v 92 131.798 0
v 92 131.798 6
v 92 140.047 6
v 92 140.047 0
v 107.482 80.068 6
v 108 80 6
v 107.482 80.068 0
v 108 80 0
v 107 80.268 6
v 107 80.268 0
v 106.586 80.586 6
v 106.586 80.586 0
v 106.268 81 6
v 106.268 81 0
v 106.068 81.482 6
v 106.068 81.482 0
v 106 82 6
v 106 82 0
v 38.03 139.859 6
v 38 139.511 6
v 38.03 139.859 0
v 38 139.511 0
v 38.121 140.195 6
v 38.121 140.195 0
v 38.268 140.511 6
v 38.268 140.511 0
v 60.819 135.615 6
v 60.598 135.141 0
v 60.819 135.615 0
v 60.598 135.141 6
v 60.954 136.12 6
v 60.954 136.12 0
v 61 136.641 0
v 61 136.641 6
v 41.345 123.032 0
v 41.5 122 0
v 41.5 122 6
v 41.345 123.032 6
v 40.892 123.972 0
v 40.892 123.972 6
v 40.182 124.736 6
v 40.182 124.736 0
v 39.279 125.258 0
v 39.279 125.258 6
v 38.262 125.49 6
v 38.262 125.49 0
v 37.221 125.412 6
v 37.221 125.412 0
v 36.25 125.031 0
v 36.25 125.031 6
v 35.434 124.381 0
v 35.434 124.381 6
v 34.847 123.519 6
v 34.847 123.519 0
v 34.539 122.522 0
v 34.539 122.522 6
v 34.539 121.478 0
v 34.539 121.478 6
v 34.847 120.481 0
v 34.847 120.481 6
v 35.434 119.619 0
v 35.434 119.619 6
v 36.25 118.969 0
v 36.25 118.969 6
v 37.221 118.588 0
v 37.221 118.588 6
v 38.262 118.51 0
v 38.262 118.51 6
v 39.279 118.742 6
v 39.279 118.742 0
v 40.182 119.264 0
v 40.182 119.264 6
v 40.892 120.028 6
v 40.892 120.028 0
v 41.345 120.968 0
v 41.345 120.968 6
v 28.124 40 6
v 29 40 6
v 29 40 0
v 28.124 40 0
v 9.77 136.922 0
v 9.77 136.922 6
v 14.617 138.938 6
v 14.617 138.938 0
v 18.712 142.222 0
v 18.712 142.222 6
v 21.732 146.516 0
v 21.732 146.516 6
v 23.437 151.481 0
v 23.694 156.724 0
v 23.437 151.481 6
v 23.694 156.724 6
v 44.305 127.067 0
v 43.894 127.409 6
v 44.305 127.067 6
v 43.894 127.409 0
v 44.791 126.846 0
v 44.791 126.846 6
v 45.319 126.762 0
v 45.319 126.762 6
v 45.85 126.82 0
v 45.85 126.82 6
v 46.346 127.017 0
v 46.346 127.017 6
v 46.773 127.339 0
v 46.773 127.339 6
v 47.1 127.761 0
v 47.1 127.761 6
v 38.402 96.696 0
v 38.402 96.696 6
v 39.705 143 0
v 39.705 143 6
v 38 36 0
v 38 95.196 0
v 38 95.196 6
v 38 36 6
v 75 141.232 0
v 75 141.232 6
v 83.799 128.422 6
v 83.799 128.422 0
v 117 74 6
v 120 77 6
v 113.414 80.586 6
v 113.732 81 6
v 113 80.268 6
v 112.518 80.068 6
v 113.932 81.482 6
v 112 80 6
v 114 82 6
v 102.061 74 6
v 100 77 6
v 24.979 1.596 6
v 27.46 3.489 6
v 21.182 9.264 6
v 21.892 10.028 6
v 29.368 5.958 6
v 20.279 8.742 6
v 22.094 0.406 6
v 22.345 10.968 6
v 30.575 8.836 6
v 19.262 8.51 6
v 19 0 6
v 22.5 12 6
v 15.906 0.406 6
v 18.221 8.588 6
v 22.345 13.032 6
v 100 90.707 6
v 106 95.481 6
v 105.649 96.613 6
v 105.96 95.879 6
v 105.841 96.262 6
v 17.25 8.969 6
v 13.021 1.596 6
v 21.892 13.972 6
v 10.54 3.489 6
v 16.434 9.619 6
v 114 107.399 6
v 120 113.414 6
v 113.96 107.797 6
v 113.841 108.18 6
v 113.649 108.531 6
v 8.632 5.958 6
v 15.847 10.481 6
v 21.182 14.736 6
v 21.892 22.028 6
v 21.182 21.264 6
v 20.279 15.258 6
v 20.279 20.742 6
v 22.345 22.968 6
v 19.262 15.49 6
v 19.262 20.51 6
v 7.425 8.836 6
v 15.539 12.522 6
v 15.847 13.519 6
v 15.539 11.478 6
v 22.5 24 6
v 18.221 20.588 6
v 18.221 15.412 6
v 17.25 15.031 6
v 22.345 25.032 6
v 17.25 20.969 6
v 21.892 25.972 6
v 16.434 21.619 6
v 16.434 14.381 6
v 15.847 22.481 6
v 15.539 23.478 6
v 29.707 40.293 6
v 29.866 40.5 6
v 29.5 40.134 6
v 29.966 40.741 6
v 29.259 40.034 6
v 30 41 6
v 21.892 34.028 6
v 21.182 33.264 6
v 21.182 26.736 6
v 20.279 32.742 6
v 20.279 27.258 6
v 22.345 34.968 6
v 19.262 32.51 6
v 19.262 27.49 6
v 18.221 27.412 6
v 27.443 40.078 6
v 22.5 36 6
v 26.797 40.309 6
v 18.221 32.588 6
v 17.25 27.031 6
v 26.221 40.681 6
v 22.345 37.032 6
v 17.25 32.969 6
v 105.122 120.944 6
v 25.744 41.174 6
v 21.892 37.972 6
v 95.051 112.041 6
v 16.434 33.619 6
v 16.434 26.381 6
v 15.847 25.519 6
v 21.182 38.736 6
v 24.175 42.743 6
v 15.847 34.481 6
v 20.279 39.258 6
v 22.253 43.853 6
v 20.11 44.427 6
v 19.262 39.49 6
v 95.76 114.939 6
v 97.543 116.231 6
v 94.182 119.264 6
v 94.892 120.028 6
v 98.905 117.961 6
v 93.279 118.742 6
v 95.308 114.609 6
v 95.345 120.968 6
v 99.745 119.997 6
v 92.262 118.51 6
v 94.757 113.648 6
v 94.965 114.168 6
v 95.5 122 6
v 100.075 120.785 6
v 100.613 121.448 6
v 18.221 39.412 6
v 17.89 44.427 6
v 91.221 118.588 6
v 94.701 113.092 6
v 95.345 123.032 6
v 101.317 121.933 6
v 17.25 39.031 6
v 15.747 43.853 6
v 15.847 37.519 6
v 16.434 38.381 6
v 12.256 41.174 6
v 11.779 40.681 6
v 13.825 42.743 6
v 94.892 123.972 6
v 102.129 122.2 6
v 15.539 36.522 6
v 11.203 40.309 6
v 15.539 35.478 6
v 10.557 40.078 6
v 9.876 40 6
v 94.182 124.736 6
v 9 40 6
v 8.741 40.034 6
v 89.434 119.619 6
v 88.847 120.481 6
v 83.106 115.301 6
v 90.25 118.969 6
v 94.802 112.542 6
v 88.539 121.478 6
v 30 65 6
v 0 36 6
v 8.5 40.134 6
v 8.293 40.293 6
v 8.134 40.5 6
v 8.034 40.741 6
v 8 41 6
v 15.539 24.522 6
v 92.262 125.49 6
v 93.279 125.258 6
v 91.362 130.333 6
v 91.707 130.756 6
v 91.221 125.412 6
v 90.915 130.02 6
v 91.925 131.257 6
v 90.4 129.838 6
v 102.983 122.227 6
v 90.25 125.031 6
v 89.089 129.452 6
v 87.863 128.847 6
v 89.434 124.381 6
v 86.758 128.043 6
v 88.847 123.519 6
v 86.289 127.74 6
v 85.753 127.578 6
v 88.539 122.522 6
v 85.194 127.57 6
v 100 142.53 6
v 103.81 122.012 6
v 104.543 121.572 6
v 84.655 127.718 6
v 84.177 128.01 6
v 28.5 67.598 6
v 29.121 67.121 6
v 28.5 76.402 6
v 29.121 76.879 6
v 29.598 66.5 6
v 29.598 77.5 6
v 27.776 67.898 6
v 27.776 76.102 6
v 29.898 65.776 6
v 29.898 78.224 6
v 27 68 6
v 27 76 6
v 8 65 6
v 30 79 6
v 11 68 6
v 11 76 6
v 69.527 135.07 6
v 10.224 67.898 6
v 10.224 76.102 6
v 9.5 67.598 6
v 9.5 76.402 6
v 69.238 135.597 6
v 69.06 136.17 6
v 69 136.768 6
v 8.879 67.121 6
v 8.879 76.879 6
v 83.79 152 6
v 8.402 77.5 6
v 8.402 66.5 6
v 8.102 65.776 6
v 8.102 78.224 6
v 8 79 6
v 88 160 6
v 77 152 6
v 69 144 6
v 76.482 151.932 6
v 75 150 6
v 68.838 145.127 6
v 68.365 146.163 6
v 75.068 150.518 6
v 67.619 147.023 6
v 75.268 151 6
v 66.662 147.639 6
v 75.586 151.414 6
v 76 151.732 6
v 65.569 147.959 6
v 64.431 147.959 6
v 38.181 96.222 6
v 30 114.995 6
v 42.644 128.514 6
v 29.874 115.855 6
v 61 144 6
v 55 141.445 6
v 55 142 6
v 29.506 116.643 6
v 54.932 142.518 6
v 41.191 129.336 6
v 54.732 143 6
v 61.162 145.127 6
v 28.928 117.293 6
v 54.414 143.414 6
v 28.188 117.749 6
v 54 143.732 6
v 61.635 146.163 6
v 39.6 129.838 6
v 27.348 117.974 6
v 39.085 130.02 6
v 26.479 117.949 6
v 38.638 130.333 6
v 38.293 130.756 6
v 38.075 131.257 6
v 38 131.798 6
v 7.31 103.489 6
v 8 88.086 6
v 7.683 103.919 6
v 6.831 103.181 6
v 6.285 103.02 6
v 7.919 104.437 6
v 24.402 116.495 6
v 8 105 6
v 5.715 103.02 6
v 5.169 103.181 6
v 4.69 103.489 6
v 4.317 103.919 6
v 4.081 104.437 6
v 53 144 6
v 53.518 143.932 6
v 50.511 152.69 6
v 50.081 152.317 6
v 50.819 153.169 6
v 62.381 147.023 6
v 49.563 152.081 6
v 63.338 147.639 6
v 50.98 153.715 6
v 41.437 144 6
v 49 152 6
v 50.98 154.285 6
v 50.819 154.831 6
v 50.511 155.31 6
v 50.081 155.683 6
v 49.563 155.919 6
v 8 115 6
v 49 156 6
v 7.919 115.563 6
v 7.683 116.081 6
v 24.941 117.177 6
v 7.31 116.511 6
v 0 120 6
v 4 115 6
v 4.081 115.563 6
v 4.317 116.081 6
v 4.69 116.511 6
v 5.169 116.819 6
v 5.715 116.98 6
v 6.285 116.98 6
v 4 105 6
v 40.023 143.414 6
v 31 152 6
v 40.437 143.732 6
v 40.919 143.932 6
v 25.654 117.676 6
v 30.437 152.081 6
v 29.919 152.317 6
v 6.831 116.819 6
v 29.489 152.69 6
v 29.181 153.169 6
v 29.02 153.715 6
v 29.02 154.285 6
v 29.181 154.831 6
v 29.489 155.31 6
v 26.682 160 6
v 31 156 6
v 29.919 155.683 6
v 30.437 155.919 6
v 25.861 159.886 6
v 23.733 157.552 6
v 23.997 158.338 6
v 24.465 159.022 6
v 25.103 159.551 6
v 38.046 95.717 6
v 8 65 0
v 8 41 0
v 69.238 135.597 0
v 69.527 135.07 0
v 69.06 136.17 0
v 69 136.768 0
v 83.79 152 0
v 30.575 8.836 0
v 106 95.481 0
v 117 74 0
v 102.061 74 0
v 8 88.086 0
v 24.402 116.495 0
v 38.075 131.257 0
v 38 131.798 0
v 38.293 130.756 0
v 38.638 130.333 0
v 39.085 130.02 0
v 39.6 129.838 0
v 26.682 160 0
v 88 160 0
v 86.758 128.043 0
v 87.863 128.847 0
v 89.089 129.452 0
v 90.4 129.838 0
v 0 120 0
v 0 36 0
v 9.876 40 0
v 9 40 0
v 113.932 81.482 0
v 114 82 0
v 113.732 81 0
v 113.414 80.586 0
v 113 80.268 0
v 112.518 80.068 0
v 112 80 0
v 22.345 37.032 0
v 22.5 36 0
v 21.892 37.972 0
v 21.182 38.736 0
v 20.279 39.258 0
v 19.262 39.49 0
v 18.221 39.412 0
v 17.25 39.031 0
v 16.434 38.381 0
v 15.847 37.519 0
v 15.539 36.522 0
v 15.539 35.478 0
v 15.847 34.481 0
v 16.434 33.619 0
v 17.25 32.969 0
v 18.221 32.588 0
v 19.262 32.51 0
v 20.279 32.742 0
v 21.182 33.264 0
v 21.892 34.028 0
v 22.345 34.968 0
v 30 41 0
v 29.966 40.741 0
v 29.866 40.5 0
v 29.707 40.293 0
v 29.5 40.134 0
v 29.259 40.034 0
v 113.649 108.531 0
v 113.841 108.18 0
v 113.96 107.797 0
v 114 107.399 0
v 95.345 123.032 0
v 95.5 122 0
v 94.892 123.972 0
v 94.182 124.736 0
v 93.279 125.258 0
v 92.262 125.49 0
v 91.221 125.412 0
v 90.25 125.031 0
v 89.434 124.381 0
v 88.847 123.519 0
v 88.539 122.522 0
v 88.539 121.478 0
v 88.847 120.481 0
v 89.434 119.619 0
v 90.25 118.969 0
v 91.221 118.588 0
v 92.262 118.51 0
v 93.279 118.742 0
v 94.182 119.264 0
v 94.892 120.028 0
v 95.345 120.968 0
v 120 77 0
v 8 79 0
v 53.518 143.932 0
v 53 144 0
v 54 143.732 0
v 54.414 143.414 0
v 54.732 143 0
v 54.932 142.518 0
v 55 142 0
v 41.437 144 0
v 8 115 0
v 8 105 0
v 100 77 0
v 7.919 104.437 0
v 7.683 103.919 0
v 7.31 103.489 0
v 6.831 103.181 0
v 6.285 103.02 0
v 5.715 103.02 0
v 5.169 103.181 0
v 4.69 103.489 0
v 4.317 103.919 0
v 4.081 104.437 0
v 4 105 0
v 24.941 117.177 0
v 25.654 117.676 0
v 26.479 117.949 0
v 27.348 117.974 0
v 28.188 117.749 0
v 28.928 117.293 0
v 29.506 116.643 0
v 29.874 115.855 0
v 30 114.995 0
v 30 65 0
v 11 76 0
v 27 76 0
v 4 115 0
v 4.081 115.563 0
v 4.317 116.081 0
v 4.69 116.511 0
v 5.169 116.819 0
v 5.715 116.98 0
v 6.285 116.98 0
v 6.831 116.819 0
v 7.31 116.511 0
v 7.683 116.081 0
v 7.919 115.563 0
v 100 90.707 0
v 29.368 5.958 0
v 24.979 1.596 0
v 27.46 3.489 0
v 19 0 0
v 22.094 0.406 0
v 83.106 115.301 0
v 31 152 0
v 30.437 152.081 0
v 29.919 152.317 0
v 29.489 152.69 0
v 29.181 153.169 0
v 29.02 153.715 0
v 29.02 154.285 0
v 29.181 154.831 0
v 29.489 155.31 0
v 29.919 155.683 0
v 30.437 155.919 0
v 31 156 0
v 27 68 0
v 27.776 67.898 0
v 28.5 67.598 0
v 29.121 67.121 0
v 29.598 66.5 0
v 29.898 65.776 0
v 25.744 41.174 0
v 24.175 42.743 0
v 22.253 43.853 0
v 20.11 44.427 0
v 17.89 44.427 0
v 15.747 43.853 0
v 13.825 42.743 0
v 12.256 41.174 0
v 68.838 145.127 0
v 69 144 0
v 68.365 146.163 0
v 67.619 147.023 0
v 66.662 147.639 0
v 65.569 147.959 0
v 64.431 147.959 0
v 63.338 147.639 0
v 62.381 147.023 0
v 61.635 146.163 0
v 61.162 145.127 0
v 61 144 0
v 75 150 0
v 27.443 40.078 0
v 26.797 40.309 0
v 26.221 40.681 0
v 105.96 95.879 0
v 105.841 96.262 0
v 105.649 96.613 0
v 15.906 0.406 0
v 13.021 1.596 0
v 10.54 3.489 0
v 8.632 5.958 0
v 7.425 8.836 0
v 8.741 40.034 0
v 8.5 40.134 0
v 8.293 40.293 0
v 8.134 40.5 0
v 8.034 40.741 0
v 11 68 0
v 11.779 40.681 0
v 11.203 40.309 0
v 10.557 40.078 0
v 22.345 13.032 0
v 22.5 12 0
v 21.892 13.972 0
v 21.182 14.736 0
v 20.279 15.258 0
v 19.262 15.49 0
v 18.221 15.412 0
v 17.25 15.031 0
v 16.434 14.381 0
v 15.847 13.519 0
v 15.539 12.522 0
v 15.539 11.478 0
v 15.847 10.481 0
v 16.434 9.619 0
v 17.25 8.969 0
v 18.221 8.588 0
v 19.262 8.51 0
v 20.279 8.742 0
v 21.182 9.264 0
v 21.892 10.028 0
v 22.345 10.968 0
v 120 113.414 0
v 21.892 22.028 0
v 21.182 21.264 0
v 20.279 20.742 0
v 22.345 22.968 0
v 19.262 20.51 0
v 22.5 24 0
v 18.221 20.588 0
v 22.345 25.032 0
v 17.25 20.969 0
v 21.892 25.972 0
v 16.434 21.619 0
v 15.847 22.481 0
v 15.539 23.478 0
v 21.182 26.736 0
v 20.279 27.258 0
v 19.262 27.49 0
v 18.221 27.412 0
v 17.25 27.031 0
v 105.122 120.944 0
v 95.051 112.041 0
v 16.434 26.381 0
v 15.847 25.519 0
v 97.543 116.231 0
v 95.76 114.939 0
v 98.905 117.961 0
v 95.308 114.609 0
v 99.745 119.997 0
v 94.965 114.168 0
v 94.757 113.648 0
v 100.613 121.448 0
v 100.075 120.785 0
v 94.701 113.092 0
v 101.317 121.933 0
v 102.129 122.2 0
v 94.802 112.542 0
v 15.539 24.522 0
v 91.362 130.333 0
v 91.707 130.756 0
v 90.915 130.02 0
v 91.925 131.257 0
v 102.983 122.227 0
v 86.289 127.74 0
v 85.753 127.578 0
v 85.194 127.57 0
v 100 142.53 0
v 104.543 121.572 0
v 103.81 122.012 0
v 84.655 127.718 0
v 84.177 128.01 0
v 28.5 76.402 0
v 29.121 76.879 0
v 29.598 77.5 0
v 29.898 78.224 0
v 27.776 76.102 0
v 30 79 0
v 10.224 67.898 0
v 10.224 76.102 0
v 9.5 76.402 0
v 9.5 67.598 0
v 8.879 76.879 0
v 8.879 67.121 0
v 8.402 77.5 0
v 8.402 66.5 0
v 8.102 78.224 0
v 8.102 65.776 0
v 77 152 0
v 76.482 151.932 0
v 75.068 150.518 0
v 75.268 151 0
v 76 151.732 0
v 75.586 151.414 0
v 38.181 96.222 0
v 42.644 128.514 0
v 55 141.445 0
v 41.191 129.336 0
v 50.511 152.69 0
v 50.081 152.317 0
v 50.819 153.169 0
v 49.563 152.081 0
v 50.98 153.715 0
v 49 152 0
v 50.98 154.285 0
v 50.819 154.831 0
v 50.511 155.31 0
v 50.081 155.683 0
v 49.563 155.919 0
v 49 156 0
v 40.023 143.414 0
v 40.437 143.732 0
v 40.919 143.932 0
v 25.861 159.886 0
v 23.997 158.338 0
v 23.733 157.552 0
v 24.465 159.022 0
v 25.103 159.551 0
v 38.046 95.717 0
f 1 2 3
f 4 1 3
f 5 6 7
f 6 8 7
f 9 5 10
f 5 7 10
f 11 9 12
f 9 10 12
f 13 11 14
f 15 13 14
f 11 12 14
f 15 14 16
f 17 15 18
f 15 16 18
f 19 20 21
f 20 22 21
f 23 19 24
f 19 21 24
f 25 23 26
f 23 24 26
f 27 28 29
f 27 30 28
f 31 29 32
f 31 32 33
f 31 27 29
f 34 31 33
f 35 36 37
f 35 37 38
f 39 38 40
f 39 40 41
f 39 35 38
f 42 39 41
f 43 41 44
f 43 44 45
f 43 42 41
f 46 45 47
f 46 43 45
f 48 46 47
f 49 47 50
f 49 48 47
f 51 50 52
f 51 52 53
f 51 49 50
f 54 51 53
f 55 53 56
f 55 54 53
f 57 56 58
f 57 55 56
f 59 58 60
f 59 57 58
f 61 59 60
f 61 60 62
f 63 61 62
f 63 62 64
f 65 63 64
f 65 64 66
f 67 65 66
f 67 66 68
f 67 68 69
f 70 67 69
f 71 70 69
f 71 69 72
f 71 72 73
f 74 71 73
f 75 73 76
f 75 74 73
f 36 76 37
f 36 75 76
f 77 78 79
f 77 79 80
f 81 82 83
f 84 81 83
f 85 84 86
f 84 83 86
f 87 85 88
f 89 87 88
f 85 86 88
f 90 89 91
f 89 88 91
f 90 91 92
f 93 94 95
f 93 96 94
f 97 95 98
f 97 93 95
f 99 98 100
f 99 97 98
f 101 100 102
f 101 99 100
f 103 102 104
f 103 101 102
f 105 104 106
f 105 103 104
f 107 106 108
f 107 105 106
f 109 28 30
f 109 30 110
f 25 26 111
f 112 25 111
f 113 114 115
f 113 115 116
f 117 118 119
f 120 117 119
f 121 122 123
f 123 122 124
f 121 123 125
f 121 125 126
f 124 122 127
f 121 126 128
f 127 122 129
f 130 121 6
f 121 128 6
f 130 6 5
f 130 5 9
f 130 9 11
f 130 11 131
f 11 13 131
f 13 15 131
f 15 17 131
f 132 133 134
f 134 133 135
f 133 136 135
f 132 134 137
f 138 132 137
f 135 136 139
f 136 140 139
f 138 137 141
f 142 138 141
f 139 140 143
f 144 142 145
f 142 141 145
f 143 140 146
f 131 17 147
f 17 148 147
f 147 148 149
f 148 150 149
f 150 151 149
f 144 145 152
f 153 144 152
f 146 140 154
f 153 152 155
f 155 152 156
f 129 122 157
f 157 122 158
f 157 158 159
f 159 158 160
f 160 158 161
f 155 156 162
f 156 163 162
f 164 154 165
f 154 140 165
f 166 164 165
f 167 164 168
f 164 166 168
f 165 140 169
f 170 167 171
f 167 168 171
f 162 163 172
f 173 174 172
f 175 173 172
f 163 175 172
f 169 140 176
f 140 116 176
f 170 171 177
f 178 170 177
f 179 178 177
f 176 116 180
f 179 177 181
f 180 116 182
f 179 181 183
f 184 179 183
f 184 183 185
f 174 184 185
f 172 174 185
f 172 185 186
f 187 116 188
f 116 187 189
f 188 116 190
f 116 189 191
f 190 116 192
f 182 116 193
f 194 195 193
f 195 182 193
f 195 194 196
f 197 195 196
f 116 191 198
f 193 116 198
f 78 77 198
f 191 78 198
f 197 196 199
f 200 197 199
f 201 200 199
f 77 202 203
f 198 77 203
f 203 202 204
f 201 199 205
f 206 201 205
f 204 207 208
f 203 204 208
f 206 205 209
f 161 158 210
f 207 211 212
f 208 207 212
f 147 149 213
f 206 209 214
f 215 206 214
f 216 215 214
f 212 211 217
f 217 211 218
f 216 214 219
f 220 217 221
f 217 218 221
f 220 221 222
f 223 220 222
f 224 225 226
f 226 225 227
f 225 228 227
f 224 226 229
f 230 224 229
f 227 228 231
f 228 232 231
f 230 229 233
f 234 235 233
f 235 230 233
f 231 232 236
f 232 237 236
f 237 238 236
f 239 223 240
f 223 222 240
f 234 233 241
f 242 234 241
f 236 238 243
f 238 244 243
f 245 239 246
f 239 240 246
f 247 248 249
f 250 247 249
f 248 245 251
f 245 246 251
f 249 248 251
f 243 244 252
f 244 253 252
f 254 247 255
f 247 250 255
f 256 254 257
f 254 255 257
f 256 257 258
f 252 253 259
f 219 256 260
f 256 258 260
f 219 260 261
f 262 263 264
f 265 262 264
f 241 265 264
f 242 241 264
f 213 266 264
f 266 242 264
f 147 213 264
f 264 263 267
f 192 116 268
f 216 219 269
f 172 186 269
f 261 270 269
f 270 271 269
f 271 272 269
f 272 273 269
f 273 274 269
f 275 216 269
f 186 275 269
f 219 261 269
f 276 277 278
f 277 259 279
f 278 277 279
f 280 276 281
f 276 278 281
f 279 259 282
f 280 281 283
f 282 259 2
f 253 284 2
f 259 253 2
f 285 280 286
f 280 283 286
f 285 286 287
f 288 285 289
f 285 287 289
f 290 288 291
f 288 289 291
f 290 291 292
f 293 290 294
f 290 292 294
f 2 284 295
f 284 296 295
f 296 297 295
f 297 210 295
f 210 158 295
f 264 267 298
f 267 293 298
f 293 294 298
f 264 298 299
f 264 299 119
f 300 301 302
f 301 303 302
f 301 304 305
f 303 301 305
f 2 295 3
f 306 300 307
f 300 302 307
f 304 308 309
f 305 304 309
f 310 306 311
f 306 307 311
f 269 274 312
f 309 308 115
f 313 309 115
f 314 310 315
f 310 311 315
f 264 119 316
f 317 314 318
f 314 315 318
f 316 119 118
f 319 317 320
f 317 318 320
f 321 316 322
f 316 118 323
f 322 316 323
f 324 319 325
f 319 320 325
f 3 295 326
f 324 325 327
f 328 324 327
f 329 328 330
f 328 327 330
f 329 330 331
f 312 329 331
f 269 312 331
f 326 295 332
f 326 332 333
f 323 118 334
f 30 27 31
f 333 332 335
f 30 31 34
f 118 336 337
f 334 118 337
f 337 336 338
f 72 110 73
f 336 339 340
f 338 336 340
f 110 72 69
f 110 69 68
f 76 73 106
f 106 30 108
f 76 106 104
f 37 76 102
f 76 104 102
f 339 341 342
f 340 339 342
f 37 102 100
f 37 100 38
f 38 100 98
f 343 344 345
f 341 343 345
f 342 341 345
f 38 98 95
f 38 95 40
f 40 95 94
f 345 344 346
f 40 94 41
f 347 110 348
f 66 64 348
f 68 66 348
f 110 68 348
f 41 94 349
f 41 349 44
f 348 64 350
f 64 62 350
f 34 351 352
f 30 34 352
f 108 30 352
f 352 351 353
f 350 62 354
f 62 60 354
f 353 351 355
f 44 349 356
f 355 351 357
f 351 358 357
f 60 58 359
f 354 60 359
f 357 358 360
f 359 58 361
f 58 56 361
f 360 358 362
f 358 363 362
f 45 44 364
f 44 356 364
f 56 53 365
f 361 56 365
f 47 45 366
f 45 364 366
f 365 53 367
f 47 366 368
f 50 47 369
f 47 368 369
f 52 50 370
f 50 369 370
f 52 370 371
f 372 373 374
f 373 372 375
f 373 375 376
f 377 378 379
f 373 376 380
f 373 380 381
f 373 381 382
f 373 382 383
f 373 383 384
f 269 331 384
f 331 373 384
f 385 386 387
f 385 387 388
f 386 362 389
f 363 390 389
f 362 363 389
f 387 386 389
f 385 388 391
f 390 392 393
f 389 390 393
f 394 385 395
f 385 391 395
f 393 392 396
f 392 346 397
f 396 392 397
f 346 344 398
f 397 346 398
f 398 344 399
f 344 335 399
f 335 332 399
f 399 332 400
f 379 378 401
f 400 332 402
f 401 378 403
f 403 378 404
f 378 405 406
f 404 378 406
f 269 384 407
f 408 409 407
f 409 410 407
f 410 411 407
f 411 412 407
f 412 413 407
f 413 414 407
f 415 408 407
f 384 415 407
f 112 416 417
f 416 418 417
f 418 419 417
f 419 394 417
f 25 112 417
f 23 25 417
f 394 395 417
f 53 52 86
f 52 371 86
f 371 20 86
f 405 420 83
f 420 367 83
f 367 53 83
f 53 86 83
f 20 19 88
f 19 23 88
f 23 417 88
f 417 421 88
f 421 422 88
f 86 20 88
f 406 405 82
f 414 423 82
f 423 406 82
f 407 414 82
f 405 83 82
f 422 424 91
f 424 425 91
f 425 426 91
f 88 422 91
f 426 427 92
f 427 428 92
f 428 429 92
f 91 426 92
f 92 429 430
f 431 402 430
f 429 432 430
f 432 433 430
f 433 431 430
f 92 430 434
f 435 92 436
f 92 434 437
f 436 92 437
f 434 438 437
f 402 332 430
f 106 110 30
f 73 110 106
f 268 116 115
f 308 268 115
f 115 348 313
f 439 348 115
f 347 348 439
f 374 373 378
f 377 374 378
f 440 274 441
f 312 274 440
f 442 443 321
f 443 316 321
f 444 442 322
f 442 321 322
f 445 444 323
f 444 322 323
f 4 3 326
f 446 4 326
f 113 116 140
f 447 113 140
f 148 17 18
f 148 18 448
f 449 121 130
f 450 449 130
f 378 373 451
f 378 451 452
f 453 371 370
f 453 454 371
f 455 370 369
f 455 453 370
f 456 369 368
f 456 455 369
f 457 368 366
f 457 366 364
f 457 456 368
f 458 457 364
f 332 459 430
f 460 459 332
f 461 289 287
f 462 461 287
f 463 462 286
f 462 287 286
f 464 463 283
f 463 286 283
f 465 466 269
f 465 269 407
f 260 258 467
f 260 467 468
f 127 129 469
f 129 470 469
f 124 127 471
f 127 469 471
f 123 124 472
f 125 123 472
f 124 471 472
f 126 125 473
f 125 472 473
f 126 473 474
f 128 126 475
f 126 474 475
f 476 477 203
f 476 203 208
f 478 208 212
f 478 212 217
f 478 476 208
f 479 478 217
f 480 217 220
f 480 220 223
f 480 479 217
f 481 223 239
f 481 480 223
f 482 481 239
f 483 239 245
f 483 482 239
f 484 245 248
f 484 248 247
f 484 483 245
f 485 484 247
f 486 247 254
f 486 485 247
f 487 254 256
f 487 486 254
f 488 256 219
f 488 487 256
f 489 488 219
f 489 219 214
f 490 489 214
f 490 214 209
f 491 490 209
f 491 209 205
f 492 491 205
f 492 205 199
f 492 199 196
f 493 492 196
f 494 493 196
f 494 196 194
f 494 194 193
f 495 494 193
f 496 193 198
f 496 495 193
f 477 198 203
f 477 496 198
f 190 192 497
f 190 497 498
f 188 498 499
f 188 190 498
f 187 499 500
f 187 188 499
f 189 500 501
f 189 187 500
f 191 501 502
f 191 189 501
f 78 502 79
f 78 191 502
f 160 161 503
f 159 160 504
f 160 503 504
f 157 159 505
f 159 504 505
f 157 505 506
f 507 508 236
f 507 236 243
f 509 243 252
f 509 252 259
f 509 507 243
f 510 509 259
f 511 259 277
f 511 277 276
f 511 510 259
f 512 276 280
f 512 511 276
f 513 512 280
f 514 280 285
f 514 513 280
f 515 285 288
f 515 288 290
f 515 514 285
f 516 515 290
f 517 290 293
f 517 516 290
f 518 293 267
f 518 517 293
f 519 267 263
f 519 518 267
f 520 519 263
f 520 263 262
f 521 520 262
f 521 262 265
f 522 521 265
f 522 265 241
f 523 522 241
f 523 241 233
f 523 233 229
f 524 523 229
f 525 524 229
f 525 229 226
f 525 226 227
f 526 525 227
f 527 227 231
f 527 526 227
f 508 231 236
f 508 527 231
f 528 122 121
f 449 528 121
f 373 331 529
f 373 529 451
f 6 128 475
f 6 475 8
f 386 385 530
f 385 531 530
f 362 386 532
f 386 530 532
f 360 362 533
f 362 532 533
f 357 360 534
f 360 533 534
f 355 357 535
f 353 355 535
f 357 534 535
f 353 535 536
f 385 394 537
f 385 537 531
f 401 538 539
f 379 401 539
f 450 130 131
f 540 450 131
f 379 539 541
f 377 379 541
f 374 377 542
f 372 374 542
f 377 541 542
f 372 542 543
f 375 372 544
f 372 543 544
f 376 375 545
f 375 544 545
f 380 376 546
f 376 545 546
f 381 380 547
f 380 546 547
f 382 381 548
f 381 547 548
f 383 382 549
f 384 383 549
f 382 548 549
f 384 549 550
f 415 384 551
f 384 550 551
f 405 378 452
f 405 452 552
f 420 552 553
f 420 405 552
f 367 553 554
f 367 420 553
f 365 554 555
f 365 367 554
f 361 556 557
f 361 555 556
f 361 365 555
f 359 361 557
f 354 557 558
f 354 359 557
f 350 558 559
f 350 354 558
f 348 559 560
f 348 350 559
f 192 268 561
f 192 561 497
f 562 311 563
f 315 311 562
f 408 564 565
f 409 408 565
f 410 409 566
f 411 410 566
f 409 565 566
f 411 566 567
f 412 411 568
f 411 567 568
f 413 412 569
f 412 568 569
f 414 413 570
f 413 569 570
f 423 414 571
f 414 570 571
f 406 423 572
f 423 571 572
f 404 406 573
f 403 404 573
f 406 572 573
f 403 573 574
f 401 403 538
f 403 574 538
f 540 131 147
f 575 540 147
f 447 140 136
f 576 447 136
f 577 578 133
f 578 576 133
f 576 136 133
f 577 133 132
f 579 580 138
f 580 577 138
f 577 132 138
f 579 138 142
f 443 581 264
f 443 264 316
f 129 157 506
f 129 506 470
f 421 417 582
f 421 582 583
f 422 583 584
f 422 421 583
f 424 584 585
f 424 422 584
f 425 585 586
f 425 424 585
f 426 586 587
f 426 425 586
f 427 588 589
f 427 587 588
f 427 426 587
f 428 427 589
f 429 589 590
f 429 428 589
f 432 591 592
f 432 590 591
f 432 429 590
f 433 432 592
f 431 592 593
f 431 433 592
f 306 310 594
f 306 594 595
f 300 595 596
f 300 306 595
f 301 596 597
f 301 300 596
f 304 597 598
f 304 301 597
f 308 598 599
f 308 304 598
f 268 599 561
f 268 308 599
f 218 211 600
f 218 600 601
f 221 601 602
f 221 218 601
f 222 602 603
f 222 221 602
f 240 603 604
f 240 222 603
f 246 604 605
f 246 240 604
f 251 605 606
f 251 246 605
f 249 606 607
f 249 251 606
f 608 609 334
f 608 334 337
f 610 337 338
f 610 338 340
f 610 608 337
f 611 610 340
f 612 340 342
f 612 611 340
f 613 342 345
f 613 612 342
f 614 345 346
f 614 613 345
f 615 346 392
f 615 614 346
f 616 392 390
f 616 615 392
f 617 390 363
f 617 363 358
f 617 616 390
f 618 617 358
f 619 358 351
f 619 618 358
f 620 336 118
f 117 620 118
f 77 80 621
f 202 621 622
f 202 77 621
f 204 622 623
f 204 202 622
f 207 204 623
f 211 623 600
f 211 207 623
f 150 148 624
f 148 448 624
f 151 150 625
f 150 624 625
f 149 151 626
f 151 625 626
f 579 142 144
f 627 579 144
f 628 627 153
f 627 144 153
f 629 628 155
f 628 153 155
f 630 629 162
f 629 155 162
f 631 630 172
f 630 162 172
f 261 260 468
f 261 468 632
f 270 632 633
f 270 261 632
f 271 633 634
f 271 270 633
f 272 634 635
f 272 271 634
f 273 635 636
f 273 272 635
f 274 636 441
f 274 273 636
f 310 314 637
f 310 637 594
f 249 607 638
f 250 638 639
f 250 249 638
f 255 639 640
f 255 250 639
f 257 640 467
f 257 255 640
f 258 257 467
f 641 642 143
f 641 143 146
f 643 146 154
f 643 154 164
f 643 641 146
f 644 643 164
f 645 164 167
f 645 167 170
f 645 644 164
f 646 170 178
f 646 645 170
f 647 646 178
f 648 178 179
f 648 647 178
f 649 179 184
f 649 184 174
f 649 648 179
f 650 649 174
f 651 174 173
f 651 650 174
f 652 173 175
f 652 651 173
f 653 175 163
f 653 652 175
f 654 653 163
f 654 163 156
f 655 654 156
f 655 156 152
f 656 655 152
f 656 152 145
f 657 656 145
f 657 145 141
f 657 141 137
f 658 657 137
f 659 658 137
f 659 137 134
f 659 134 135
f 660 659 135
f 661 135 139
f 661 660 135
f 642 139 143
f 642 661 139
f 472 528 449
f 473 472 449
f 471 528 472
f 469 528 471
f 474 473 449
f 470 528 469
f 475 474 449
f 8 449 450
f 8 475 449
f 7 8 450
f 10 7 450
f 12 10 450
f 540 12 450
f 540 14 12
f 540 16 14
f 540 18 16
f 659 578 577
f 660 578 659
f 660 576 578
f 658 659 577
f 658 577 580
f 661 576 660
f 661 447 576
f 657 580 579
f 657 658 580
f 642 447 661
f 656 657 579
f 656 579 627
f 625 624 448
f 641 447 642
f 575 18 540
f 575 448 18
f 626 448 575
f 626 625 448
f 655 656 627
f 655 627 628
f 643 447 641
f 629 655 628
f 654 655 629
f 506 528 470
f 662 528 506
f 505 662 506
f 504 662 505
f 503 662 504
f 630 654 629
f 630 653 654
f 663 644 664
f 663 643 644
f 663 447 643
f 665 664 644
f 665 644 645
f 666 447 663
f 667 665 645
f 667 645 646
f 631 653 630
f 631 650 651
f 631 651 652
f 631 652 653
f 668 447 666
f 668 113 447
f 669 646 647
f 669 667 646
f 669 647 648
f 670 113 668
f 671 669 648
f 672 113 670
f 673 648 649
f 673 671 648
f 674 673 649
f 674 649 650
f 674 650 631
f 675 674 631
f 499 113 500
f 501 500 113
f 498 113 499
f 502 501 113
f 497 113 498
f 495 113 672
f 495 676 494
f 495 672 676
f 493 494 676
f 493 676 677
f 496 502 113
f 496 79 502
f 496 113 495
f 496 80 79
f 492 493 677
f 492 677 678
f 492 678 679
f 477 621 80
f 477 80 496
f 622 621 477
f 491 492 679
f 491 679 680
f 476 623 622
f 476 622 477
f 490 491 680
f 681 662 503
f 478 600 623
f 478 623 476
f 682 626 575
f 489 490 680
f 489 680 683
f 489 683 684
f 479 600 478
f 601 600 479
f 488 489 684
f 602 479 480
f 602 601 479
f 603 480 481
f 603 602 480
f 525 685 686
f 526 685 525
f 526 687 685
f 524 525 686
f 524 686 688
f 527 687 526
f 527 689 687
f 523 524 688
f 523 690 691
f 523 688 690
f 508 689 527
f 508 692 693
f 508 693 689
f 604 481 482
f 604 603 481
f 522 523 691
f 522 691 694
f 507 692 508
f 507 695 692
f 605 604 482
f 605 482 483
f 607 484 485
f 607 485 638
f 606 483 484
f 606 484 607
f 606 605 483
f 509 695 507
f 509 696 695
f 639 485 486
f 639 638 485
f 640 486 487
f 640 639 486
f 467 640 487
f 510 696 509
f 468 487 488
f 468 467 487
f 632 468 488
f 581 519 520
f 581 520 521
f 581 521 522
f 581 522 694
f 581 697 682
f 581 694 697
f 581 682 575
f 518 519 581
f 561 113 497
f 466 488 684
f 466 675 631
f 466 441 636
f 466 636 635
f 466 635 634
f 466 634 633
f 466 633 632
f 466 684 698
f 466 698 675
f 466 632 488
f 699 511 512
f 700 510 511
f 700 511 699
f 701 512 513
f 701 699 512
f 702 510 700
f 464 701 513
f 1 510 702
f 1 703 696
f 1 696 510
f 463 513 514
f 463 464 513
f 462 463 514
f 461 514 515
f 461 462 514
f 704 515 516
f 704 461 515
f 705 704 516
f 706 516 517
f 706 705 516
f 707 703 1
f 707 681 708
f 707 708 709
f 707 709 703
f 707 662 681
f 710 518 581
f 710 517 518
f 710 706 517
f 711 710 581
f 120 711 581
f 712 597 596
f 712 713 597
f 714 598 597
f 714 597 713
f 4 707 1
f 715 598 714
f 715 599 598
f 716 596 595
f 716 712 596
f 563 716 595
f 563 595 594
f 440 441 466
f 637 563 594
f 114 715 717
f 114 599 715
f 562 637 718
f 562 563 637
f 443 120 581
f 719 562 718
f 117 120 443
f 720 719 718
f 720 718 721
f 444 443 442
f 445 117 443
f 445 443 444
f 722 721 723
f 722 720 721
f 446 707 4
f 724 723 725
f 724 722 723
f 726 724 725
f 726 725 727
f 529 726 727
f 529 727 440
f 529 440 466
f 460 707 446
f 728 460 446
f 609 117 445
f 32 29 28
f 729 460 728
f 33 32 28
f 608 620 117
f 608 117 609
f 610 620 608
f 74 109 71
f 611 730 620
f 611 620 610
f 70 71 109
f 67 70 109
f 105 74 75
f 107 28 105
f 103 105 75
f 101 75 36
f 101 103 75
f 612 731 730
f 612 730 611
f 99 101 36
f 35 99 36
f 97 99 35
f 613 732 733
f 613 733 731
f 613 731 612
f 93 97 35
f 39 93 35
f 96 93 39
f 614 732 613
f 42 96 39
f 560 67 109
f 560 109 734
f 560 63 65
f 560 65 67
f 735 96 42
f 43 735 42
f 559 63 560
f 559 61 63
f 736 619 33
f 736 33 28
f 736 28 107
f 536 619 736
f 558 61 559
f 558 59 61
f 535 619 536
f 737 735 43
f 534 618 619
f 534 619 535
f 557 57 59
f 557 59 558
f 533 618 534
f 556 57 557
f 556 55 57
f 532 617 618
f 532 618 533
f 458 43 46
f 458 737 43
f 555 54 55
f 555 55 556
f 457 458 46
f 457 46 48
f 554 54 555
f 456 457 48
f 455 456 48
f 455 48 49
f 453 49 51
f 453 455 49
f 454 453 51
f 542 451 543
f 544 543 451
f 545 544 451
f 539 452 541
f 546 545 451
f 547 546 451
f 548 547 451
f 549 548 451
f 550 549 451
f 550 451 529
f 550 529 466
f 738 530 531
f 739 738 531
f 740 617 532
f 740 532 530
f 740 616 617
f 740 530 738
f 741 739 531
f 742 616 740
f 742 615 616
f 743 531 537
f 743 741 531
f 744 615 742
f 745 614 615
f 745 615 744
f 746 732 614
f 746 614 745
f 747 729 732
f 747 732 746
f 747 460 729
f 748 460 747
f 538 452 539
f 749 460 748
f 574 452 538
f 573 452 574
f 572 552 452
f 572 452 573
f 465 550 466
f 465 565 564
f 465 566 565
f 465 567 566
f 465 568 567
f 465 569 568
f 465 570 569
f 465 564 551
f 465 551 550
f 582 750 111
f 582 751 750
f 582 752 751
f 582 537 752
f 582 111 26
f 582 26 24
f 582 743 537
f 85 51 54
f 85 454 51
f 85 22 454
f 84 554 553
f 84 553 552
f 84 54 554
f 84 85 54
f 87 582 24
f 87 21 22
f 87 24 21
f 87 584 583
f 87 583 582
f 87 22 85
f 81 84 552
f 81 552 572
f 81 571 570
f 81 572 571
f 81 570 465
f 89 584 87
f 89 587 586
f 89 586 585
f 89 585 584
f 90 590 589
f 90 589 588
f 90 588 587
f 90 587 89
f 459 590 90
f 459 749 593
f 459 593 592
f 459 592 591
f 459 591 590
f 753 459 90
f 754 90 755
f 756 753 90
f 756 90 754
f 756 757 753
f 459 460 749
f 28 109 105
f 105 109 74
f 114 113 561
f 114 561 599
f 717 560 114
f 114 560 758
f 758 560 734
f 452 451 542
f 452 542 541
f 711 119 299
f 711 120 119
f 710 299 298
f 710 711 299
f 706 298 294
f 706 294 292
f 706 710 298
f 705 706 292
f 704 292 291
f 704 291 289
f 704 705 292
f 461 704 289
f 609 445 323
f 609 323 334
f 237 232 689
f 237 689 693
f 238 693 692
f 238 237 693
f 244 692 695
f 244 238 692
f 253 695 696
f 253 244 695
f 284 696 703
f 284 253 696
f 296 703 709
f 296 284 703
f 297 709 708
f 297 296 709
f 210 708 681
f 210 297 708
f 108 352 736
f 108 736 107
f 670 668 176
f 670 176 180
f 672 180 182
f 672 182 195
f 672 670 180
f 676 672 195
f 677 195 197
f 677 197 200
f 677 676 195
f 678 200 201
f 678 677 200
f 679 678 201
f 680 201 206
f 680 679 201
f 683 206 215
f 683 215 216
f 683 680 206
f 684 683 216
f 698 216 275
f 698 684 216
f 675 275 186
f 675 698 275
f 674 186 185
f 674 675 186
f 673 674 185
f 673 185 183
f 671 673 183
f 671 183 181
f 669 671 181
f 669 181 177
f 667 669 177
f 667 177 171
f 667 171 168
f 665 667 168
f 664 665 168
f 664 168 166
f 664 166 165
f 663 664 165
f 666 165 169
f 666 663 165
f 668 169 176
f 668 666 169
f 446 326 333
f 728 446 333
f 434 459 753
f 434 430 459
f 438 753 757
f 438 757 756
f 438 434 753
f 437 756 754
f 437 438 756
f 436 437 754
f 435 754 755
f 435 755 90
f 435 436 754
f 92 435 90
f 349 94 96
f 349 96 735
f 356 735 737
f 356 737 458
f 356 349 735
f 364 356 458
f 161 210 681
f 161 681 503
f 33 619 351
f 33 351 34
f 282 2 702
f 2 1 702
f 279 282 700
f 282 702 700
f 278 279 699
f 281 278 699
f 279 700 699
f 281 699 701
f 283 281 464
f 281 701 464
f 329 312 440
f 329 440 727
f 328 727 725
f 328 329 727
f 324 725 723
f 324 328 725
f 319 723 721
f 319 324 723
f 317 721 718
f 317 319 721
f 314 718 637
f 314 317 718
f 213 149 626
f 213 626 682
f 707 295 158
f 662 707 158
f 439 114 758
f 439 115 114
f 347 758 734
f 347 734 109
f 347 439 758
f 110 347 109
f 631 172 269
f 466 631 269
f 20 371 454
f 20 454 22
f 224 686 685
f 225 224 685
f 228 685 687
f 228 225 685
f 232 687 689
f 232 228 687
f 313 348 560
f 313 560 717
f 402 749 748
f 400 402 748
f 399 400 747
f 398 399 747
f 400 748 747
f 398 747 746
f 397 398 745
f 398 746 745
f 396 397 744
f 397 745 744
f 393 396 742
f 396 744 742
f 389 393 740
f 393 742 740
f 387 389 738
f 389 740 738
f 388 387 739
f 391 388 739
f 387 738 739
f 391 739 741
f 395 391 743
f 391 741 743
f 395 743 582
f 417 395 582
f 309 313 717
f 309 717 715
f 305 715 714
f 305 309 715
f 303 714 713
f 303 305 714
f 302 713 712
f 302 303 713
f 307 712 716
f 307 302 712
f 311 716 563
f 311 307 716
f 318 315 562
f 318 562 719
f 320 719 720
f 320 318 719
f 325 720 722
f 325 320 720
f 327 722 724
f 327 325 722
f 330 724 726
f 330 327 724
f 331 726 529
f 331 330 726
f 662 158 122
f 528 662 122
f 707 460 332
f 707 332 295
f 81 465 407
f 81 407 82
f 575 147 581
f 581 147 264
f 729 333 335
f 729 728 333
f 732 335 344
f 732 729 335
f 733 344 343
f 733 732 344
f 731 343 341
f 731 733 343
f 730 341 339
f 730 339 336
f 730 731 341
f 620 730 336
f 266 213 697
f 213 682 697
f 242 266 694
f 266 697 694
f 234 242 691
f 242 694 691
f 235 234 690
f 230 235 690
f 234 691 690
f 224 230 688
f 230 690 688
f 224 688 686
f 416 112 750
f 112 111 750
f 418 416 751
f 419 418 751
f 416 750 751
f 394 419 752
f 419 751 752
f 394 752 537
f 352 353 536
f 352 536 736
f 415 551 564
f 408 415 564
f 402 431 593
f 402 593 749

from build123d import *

# Parameters (mm, degrees)
ESBO_O1_R                = 3.5
RESSALTO_EXTRUS_O1_DEPTH = 6
FILETE1_R                = 3
CHANFRO1_SIZE            = 2
CORTE_EXTRUS_O1_DEPTH    = 6
RESSALTO_EXTRUS_O2_DEPTH = 6
CORTE_EXTRUS_O2_DEPTH    = 10
FILETE2_R                = 2
CORTE_EXTRUS_O3_DEPTH    = 10
CORTE_EXTRUS_O4_DEPTH    = 201.089979759
CORTE_EXTRUS_O5_DEPTH    = 201.089979759
FILETE3_R                = 3


with BuildPart() as part:
    # Esboço1 → Ressalto-extrusão1 (new body)
    with BuildSketch(Plane.XY):
        with BuildLine():
            Line((23.094010768, 160), (88, 160))
            Line((88, 160), (100, 142.530265141))
            Line((100, 142.530265141), (100, 114))
            Line((100, 114), (84, 114))
            Line((84, 114), (69, 135.837168574))
            Line((69, 135.837168574), (69, 144))
            ThreePointArc((69, 144), (65, 148), (61, 144))
            Line((61, 144), (61, 135.837168574))
            Line((61, 135.837168574), (38, 96))
            Line((38, 96), (38, 0))
            Line((38, 0), (0, 0))
            Line((0, 0), (0, 120))
            Line((0, 120), (23.094010768, 160))
        make_face()
        with Locations((19, 12)):
            Circle(ESBO_O1_R, mode=Mode.SUBTRACT)
        with Locations((19, 24)):
            Circle(ESBO_O1_R, mode=Mode.SUBTRACT)
        with Locations((19, 36)):
            Circle(ESBO_O1_R, mode=Mode.SUBTRACT)
        with Locations((92, 122)):
            Circle(ESBO_O1_R, mode=Mode.SUBTRACT)
        with Locations((38, 122)):
            Circle(ESBO_O1_R, mode=Mode.SUBTRACT)
        with BuildLine():
            Line((41, 156), (49, 156))
            ThreePointArc((49, 156), (51, 154), (49, 152))
            Line((49, 152), (41, 152))
            ThreePointArc((41, 152), (39, 154), (41, 156))
        make_face(mode=Mode.SUBTRACT)
        with BuildLine():
            Line((8, 115), (8, 105))
            ThreePointArc((8, 105), (6, 103), (4, 105))
            Line((4, 105), (4, 115))
            ThreePointArc((4, 115), (6, 117), (8, 115))
        make_face(mode=Mode.SUBTRACT)
    extrude(amount=RESSALTO_EXTRUS_O1_DEPTH)

    # Filete1
    filete1_edges = [part.edges().sort_by_distance(p)[0] for p in [
        (100, 114, 3),
        (84, 114, 3),
        (69, 135.837168574, 3),
        (61, 135.837168574, 3),
        (38, 96, 3),
    ]]
    fillet(filete1_edges, radius=FILETE1_R)

    # Chanfro1
    chanfro1_edges = [part.edges().sort_by_distance(p)[0] for p in [
        (38, 0, 3),
        (0, 0, 3),
    ]]
    chamfer(chanfro1_edges, length=CHANFRO1_SIZE)

    # Esboço2 → Corte-extrusão1 (cut)
    with BuildSketch(Plane.XY.offset(6)):
        with BuildLine():
            Line((75, 152), (75, 141.231728845))
            Line((75, 141.231728845), (85.255212875, 126.30207469))
            ThreePointArc((85.255212875, 126.30207469), (88.154001919, 129.014862704), (92, 130))
            Line((92, 130), (92, 140.047327347))
            Line((92, 140.047327347), (83.789682385, 152))
            Line((83.789682385, 152), (75, 152))
        make_face()
        with BuildLine():
            Line((38, 130), (38, 140.047327347))
            Line((38, 140.047327347), (40.28207662, 144))
            Line((40.28207662, 144), (55, 144))
            Line((55, 144), (55, 141.444863729))
            Line((55, 141.444863729), (45.452626018, 124.908326913))
            ThreePointArc((45.452626018, 124.908326913), (42.512947191, 128.605551275), (38, 130))
        make_face()
    extrude(amount=-CORTE_EXTRUS_O1_DEPTH, mode=Mode.SUBTRACT)

    # Esboço3 → Ressalto-extrusão2 (add, through all)
    with BuildSketch(Plane.XY.offset(6)):
        Polygon((100, 142.530265141), (120, 113.414040375), (120, 77), (117, 74), (102.060706719, 74), (100, 77), (100, 90.707020188), (83.106053471, 115.301417403), (100, 117), align=None)
    extrude(amount=-RESSALTO_EXTRUS_O2_DEPTH)

    # Esboço4 → Corte-extrusão2 (cut)
    with BuildSketch(Plane.XY.offset(6)):
        with BuildLine():
            Line((105.122276139, 120.943770271), (114, 108.019480105))
            Line((114, 108.019480105), (114, 80))
            Line((114, 80), (106, 80))
            Line((106, 80), (106, 96.101580458))
            Line((106, 96.101580458), (93.595183818, 114.160651265))
            ThreePointArc((93.595183818, 114.160651265), (97.506753293, 116.196925973), (99.745062186, 119.996500127))
            ThreePointArc((99.745062186, 119.996500127), (102.128983719, 122.199693371), (105.122276139, 120.943770271))
        make_face()
    extrude(amount=-CORTE_EXTRUS_O2_DEPTH, mode=Mode.SUBTRACT)

    # Filete2
    filete2_edges = [part.edges().sort_by_distance(p)[0] for p in [
        (75, 152, 3),
        (92, 130, 3),
        (85.255212875, 126.30207469, 3),
        (45.452626018, 124.908326913, 3),
        (38, 130, 3),
        (38, 140.047327347, 3),
        (40.28207662, 144, 3),
        (55, 144, 3),
        (114, 108.019480105, 3),
        (114, 80, 3),
        (106, 80, 3),
        (106, 96.101580458, 3),
        (93.595183818, 114.160651265, 3),
    ]]
    fillet(filete2_edges, radius=FILETE2_R)

    # Esboço5 → Corte-extrusão3 (cut)
    with BuildSketch(Plane.XY.offset(6)):
        with BuildLine():
            ThreePointArc((19.000000124, 0), (11.718734325, 2.46149015), (7.424595906, 8.836138426))
            Line((7.424595906, 8.836138426), (0, 36))
            Line((0, 36), (0, 0))
            Line((0, 0), (19.000000124, 0))
        make_face()
        with BuildLine():
            ThreePointArc((30.575404094, 8.836138426), (26.281265774, 2.461490225), (19.000000124, 0))
            Line((19.000000124, 0), (38, 0))
            Line((38, 0), (38, 36))
            Line((38, 36), (30.575404094, 8.836138426))
        make_face()
        with BuildLine():
            Line((30, 65), (30, 41))
            ThreePointArc((30, 41), (29.707106781, 40.292893219), (29, 40))
            Line((29, 40), (28.124143795, 40))
            ThreePointArc((28.124143795, 40), (26.79716619, 40.309436781), (25.743932371, 41.173913043))
            ThreePointArc((25.743932371, 41.173913043), (19, 44.5), (12.256067629, 41.173913043))
            ThreePointArc((12.256067629, 41.173913043), (11.20283381, 40.309436781), (9.875856205, 40))
            Line((9.875856205, 40), (9, 40))
            ThreePointArc((9, 40), (8.292893219, 40.292893219), (8, 41))
            Line((8, 41), (8, 65))
            ThreePointArc((8, 65), (8.878679656, 67.121320344), (11, 68))
            Line((11, 68), (27, 68))
            ThreePointArc((27, 68), (29.121320344, 67.121320344), (30, 65))
        make_face()
        with BuildLine():
            ThreePointArc((30, 79), (29.121320344, 76.878679656), (27, 76))
            Line((27, 76), (11, 76))
            ThreePointArc((11, 76), (8.878679656, 76.878679656), (8, 79))
            Line((8, 79), (8, 88.08580312))
            Line((8, 88.08580312), (24.401923789, 116.494768463))
            ThreePointArc((24.401923789, 116.494768463), (27.776457135, 117.892545942), (30, 114.994768463))
            Line((30, 114.994768463), (30, 79))
        make_face()
    extrude(amount=-CORTE_EXTRUS_O3_DEPTH, mode=Mode.SUBTRACT)

    # Esboço6 → Corte-extrusão4 (cut, through all)
    with BuildSketch(Plane.XY.offset(6)):
        with BuildLine():
            Line((31, 156), (49, 156))
            ThreePointArc((49, 156), (51, 154), (49, 152))
            Line((49, 152), (31, 152))
            ThreePointArc((31, 152), (29, 154), (31, 156))
        make_face()
    extrude(amount=-CORTE_EXTRUS_O4_DEPTH, mode=Mode.SUBTRACT)

    # Esboço7 → Corte-extrusão5 (cut, through all)
    with BuildSketch(Plane.XY.offset(6)):
        with BuildLine():
            Line((23.094010768, 160), (9.770017724, 136.92216709))
            ThreePointArc((9.770017724, 136.92216709), (21.270577597, 145.667537692), (23.094010768, 160))
        make_face()
    extrude(amount=-CORTE_EXTRUS_O5_DEPTH, mode=Mode.SUBTRACT)

    # Filete3
    filete3_edges = [part.edges().sort_by_distance(p)[0] for p in [
        (23.094010768, 160, 3),
    ]]
    fillet(filete3_edges, radius=FILETE3_R)


solid = part.part
